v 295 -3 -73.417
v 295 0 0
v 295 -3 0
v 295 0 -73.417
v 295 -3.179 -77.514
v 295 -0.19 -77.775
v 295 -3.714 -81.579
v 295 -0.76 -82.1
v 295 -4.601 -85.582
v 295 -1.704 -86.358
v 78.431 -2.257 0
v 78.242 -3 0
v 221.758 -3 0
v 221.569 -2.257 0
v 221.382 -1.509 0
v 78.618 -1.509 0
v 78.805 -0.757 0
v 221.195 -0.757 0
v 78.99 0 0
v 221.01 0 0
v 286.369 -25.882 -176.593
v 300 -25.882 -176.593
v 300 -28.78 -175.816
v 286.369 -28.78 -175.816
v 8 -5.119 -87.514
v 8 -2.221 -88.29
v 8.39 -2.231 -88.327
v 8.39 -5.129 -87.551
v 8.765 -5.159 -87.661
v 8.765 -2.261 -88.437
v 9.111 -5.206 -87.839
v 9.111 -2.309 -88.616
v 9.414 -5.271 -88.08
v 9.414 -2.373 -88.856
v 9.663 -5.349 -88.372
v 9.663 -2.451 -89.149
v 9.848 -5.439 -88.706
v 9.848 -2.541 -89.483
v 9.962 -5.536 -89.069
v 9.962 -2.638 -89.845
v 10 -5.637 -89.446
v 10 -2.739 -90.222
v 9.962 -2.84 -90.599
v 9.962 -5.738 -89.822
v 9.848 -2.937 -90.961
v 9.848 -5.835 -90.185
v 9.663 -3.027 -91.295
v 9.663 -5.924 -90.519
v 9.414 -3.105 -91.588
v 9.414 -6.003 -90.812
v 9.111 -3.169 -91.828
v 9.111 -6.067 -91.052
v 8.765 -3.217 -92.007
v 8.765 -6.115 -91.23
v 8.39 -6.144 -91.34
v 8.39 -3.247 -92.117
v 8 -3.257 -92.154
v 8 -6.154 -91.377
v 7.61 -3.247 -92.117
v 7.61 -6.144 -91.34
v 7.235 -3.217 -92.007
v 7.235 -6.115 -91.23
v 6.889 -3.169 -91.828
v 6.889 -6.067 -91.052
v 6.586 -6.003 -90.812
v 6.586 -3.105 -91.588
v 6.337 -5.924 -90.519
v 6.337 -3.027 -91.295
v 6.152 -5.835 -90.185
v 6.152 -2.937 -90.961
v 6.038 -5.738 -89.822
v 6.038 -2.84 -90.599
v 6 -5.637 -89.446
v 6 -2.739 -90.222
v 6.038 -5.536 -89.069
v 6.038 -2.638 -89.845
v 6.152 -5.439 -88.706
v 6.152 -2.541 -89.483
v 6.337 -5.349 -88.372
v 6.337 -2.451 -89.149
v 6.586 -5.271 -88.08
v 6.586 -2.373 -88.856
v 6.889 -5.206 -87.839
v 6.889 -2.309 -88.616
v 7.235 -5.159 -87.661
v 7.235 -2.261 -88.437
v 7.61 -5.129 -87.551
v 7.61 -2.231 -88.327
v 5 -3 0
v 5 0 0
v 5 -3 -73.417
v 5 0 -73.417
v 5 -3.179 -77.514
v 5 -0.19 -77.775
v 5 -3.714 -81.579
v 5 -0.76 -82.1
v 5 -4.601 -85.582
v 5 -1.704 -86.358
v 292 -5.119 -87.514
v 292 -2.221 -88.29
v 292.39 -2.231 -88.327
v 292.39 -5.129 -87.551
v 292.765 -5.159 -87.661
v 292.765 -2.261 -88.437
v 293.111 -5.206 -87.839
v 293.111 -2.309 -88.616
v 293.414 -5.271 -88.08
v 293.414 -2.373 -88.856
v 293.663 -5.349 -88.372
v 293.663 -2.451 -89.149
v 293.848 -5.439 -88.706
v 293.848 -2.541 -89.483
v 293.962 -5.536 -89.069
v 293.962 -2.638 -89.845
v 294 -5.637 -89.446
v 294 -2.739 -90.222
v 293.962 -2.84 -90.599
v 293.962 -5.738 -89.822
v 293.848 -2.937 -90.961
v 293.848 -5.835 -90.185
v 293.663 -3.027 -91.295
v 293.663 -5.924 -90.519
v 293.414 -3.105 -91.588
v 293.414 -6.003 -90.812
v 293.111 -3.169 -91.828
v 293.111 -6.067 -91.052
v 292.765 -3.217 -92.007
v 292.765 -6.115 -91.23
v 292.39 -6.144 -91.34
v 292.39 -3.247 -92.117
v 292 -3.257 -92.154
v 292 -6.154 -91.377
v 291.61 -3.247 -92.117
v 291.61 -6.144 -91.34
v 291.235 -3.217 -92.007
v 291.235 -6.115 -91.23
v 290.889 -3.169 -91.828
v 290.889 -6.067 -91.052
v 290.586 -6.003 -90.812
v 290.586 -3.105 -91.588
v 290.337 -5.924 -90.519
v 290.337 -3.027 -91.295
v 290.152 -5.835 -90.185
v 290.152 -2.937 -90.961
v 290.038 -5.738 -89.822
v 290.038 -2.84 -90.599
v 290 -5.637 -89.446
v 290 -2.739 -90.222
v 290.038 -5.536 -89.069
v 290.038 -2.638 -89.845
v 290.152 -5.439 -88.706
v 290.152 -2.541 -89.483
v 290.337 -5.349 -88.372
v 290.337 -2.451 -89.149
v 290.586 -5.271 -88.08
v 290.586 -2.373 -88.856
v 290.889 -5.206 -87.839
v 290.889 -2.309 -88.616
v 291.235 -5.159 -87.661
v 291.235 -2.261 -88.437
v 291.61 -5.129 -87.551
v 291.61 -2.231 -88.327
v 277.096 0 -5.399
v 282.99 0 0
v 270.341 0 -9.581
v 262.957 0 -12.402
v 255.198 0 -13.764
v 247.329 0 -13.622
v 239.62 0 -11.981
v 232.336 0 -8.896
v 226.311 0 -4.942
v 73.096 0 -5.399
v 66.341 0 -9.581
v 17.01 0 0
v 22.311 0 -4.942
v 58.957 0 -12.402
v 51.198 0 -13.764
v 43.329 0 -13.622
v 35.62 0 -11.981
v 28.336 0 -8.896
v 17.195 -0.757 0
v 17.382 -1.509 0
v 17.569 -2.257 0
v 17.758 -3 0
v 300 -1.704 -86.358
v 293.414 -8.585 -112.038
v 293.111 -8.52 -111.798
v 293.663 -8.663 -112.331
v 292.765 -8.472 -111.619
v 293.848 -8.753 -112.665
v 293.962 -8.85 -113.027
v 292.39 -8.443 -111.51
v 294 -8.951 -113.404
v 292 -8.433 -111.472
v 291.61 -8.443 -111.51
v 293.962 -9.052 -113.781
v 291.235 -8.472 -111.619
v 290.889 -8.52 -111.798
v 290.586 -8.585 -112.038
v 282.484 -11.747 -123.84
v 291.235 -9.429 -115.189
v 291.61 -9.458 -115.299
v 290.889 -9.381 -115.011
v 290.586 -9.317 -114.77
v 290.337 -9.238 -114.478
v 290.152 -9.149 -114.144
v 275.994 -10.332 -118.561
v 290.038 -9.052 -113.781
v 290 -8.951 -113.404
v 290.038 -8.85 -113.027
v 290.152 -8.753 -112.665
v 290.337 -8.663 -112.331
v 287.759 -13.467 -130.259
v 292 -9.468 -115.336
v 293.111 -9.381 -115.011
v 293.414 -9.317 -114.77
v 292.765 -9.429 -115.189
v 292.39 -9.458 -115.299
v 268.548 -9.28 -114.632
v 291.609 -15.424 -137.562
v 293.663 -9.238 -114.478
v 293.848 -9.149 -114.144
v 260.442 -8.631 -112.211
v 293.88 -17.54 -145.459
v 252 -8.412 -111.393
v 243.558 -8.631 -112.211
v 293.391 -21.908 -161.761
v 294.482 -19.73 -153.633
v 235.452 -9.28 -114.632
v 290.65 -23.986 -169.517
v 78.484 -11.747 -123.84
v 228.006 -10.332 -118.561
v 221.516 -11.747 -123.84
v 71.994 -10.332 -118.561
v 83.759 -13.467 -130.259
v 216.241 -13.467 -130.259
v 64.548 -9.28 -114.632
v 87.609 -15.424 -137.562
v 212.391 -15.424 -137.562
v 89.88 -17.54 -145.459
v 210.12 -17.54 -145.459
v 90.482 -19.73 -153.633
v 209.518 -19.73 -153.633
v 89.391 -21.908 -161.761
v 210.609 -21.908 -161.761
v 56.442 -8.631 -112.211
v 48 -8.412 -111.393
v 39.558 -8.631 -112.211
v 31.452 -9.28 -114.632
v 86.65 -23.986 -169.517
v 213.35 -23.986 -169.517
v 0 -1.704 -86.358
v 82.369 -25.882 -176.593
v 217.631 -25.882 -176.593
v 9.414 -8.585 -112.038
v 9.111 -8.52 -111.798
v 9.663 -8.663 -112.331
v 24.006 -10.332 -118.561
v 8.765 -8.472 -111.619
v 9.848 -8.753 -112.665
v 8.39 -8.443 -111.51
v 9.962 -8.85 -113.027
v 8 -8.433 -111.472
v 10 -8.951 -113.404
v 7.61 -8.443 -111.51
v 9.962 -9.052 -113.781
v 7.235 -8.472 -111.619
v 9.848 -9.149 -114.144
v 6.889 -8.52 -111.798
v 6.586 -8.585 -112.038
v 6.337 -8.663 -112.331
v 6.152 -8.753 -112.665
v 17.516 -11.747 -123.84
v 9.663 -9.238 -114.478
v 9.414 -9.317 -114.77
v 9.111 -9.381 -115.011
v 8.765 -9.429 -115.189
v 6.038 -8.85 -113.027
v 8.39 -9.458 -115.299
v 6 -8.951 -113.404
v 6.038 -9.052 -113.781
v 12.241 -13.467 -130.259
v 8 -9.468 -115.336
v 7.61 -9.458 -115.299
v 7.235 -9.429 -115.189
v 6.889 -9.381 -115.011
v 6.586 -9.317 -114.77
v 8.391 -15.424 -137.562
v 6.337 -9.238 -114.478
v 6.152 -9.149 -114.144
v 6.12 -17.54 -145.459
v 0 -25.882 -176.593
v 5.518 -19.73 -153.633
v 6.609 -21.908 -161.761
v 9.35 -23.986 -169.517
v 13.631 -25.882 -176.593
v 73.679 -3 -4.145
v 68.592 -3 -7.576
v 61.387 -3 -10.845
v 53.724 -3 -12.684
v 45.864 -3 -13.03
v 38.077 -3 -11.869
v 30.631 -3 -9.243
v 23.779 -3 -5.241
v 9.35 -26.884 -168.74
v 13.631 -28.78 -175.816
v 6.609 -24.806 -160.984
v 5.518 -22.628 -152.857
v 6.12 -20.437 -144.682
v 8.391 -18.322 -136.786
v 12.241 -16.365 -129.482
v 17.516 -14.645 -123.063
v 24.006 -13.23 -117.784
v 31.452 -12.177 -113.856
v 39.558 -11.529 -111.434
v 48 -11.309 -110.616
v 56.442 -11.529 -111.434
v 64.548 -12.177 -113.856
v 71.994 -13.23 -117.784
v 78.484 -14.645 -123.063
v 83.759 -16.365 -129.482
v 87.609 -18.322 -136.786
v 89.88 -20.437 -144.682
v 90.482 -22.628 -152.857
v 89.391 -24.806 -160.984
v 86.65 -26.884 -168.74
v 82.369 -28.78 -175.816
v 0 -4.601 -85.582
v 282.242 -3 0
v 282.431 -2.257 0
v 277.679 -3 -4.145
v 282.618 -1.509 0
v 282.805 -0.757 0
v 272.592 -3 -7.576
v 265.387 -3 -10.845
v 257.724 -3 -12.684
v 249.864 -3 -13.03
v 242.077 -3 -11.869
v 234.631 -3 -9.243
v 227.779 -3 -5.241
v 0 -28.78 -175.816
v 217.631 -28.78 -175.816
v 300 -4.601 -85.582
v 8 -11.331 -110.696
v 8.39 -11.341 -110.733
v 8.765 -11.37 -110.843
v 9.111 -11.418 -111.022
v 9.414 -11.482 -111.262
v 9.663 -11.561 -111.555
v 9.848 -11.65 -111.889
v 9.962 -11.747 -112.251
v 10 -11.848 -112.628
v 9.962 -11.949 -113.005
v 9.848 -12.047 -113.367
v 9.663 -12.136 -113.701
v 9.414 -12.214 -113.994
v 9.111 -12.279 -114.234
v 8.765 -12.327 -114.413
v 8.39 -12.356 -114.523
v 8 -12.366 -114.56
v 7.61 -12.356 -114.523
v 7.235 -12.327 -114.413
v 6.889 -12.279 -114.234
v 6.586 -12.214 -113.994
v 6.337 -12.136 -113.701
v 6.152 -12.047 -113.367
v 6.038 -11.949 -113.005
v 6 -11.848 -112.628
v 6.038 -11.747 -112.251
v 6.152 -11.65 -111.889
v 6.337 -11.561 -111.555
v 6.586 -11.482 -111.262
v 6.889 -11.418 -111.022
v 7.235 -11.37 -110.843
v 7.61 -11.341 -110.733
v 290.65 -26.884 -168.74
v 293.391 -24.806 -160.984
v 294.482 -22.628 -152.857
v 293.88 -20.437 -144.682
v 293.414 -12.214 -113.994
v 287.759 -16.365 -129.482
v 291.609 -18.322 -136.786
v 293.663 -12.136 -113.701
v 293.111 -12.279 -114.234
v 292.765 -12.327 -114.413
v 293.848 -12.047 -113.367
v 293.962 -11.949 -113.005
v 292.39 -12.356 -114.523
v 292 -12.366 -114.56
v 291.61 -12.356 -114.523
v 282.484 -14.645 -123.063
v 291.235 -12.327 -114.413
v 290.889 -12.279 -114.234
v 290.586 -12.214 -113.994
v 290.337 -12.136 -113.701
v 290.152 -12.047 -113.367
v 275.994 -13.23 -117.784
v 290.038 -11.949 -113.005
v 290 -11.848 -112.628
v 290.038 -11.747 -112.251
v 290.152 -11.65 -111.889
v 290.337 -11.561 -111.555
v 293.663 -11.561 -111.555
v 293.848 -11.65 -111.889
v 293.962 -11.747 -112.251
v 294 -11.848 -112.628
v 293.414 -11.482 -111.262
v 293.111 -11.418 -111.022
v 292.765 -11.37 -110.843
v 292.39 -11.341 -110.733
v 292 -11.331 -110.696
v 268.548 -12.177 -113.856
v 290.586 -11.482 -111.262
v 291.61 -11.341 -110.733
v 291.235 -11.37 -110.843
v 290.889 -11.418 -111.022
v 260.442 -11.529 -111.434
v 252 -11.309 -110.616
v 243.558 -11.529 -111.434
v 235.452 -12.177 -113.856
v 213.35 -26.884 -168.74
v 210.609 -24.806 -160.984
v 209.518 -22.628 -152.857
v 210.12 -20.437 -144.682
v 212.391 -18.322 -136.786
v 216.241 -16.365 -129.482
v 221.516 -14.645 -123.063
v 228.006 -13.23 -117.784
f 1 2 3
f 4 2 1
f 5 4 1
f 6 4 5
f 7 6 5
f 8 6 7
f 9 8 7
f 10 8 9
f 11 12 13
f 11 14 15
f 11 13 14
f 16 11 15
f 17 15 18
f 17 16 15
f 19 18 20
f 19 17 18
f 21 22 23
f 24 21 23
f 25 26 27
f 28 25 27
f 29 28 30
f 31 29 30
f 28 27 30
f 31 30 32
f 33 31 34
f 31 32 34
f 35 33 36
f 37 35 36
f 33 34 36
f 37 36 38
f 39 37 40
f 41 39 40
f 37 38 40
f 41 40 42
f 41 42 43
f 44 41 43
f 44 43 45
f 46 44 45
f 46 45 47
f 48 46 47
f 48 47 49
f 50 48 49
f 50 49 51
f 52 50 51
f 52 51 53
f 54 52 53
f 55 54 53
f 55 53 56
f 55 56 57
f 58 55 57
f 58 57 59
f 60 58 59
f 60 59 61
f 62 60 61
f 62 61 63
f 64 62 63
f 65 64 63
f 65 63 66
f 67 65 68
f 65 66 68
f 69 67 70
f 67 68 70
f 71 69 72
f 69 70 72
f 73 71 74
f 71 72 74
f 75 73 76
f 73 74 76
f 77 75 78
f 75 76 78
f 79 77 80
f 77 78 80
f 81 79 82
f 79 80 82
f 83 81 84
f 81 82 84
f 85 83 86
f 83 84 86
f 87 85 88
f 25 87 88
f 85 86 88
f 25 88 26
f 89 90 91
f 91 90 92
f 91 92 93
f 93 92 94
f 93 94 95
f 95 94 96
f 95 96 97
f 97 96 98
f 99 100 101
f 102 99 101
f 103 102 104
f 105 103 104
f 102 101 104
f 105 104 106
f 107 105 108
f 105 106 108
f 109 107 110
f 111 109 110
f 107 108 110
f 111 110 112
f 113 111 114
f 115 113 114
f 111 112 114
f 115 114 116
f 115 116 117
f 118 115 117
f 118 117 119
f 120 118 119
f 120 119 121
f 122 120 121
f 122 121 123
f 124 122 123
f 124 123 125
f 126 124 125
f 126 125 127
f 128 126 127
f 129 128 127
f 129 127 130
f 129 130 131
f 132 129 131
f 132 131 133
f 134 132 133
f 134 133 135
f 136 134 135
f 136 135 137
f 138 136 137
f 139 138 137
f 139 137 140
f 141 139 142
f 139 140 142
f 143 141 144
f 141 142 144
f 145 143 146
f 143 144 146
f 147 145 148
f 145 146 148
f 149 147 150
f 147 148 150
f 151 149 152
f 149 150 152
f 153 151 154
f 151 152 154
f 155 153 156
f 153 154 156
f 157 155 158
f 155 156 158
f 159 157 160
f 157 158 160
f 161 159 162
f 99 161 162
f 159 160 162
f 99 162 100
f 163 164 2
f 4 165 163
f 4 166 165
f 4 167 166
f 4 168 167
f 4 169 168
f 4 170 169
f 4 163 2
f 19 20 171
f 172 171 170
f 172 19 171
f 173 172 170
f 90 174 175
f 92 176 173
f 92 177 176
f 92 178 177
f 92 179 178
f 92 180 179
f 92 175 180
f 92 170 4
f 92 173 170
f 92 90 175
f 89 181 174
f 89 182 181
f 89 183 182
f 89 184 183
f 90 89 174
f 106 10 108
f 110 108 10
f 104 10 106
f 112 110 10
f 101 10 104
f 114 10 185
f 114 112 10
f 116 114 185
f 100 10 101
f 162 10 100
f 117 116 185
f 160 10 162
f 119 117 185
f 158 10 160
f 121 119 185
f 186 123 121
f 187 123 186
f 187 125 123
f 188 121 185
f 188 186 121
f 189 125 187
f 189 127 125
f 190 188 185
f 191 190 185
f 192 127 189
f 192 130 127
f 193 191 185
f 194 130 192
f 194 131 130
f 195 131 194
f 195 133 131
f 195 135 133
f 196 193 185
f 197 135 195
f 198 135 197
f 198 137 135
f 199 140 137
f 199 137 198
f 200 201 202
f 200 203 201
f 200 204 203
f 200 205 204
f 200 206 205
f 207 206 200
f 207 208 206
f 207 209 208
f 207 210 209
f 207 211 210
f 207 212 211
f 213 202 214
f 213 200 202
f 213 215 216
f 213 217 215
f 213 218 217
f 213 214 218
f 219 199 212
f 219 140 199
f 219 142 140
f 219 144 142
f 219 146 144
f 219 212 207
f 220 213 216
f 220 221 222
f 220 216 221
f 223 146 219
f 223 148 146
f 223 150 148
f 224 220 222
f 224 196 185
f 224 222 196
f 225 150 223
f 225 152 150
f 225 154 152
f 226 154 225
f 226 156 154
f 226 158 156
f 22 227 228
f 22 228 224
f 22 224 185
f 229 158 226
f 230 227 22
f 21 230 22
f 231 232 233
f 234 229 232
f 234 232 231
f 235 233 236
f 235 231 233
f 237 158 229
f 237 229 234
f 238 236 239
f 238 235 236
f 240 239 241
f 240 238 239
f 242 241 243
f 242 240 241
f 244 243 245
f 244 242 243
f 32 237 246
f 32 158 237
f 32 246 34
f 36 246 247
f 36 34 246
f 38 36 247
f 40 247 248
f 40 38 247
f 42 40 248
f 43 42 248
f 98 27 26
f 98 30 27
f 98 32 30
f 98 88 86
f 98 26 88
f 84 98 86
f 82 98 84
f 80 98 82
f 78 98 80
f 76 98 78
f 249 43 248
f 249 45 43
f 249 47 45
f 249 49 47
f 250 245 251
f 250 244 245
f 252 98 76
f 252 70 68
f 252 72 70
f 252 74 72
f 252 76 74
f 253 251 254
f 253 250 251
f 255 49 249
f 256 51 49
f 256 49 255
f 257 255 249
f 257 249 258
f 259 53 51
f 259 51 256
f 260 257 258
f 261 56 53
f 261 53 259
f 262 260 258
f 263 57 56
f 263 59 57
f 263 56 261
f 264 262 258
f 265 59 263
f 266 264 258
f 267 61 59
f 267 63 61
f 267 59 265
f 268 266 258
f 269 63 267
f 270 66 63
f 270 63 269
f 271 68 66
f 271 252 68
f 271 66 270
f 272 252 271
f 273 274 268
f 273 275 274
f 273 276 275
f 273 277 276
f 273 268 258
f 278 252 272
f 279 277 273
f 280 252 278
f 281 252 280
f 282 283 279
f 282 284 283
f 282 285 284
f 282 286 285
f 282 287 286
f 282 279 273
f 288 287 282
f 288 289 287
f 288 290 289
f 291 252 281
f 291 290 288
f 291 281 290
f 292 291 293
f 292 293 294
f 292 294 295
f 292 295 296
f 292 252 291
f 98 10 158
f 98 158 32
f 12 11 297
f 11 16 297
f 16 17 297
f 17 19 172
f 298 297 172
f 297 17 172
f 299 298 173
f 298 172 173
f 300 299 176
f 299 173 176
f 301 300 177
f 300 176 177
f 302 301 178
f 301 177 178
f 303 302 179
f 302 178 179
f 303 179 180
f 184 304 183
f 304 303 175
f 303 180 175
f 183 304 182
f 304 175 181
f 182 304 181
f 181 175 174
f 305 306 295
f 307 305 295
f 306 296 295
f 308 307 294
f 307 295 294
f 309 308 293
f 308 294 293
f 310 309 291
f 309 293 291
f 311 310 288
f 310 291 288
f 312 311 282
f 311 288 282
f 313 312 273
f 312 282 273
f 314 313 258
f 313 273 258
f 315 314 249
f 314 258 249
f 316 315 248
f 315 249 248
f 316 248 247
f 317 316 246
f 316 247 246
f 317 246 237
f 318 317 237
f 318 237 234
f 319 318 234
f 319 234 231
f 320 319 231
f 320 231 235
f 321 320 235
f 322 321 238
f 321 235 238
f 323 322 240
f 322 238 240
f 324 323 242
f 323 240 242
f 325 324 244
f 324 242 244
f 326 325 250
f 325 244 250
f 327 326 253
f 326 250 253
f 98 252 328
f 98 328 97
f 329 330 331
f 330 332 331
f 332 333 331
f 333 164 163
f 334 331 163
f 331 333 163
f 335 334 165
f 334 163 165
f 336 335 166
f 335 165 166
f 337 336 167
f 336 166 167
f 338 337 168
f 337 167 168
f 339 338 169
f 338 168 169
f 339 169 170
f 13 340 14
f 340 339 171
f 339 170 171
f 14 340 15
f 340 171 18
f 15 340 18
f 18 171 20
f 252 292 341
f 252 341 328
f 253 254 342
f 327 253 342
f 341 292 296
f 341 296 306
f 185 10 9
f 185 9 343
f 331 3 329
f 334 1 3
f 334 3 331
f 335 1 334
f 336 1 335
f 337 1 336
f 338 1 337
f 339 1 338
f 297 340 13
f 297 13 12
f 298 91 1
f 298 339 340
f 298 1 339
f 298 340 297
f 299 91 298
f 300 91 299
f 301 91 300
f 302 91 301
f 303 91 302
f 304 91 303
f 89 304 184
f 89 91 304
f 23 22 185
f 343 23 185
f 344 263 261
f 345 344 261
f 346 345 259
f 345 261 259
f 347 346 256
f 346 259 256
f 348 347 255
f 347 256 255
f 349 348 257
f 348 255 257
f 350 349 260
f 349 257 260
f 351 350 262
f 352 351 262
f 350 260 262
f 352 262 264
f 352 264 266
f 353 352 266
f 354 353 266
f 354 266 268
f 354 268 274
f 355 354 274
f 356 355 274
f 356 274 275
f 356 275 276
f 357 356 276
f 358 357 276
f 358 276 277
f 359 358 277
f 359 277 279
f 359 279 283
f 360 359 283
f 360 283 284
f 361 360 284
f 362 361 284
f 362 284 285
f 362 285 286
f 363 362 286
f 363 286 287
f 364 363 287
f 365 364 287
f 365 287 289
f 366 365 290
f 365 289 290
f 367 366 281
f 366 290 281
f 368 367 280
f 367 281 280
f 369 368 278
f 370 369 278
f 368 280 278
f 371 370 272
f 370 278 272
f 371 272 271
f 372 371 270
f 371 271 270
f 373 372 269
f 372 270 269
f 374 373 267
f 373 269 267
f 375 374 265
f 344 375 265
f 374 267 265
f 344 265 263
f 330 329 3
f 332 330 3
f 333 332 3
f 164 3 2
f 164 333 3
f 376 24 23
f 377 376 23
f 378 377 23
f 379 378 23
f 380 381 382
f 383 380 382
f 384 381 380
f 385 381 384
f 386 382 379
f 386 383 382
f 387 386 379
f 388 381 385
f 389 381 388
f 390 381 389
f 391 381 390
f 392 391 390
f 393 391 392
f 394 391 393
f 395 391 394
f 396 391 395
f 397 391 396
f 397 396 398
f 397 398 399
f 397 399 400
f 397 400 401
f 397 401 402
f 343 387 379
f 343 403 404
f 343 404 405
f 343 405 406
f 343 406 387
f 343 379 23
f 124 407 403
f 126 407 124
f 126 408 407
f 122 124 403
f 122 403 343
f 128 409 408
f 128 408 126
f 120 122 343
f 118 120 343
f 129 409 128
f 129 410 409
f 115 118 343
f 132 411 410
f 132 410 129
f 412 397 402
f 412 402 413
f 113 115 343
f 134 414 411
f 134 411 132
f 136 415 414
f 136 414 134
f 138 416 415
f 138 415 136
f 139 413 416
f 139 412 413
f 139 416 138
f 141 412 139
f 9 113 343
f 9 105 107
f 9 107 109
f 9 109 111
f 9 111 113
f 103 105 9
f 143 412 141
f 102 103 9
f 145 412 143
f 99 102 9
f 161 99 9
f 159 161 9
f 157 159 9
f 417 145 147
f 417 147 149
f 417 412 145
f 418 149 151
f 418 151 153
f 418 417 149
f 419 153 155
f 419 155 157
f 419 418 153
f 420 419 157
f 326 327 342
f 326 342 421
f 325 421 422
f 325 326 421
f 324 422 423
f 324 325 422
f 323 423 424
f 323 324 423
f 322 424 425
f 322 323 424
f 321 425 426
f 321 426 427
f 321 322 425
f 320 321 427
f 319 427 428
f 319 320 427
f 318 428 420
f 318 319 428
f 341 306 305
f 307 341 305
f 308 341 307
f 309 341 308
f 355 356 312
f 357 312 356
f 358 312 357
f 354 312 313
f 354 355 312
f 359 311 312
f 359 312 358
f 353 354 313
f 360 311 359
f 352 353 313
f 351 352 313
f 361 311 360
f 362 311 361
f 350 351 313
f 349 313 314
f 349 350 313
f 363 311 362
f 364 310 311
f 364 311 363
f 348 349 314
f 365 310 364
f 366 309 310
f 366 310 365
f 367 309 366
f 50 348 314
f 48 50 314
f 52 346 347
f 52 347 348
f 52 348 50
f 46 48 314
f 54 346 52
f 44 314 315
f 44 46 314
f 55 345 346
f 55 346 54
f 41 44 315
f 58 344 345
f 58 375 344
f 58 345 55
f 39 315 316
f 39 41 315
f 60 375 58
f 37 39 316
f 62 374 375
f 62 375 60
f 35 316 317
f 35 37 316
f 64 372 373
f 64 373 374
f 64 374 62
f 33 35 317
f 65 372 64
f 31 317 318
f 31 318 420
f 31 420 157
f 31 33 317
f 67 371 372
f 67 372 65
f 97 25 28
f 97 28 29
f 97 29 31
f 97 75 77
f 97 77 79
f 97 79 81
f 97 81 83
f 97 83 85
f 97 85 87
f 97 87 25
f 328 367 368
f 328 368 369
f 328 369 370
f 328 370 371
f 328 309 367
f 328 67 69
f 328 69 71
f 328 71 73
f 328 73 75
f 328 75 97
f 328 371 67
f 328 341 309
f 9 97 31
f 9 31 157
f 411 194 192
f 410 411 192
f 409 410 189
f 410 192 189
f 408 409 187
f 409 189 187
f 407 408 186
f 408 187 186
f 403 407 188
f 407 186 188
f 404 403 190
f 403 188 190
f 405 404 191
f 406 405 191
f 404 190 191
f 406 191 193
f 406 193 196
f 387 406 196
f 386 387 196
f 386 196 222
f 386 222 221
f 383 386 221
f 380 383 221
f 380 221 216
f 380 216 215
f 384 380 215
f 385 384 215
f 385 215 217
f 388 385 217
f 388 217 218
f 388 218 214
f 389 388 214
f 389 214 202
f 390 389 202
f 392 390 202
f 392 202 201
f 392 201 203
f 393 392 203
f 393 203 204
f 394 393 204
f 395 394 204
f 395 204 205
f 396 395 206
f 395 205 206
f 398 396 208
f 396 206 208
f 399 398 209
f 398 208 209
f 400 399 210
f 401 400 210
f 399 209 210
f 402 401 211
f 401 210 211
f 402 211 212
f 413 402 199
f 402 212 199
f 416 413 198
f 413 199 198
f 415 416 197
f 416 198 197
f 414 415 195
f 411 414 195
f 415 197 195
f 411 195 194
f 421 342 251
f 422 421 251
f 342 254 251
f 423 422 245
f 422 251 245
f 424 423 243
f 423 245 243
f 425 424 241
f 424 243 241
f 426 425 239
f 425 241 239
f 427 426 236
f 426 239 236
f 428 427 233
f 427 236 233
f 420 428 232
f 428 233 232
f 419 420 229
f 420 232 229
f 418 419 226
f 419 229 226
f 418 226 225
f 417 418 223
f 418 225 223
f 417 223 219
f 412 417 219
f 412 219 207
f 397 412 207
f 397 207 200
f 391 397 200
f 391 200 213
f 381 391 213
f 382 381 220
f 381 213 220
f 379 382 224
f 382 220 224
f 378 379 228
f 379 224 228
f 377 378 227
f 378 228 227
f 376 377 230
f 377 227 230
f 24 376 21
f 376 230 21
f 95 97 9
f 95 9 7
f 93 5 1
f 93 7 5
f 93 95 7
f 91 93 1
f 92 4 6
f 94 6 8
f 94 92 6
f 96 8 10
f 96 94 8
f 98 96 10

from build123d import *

# Parameters (mm, degrees)
BOSS_EXTRUDE1_DEPTH = 300
SKETCH2_R           = 42.5
SKETCH2_W           = 5
SKETCH2_H           = 83.856690982
CUT_EXTRUDE1_DEPTH  = 349.855848061
SKETCH3_R           = 2
CUT_EXTRUDE2_DEPTH  = 349.855848061


with BuildPart() as part:
    # Sketch1 → Boss-Extrude1 (new body)
    with BuildSketch(Plane(origin=(0, 0, 0), x_dir=(0, 0, -1), z_dir=(1, 0, 0))):
        with BuildLine():
            Line((0, 0), (73.417375121, 0))
            ThreePointArc((73.417375121, 0), (79.943684732, -0.427756931), (86.358327376, -1.703708686))
            Line((86.358327376, -1.703708686), (176.592582629, -25.88190451))
            Line((176.592582629, -25.88190451), (175.816125494, -28.779681989))
            Line((175.816125494, -28.779681989), (85.58187024, -4.601486164))
            ThreePointArc((85.58187024, -4.601486164), (79.552106155, -3.402091515), (73.417375121, -3))
            Line((73.417375121, -3), (0, -3))
            Line((0, -3), (0, 0))
        make_face()
    extrude(amount=BOSS_EXTRUDE1_DEPTH)

    # Sketch2 → Cut-Extrude1 (cut, through all)
    with BuildSketch(Plane(origin=(0, 20, -5.358983849), x_dir=(1, 0, 0), z_dir=(0, 0.9659258262890681, -0.25881904510252174))):
        with Locations((48, 152.274066103)):
            Circle(SKETCH2_R)
        with Locations((252, 152.274066103)):
            Circle(SKETCH2_R)
        with Locations((48, -29.084261273)):
            Circle(SKETCH2_R)
        with Locations((252, -29.084261273)):
            Circle(SKETCH2_R)
        with Locations((2.5, 41.928345491)):
            Rectangle(SKETCH2_W, SKETCH2_H)
        with Locations((297.5, 41.928345491)):
            Rectangle(SKETCH2_W, SKETCH2_H)
    extrude(amount=-CUT_EXTRUDE1_DEPTH, mode=Mode.SUBTRACT)

    # Sketch3 → Cut-Extrude2 (cut, through all)
    with BuildSketch(Plane(origin=(0, 20, -5.358983849), x_dir=(1, 0, 0), z_dir=(0, 0.9659258262890681, -0.25881904510252174))):
        with Locations(Location((8, 87.856690982, 0), (0, 0, 270))):
            Circle(SKETCH3_R)
        with Locations(Location((8, 111.856690982, 0), (0, 0, 270))):
            Circle(SKETCH3_R)
        with Locations(Location((292, 87.856690982, 0), (0, 0, 270))):
            Circle(SKETCH3_R)
        with Locations(Location((292, 111.856690982, 0), (0, 0, 270))):
            Circle(SKETCH3_R)
    extrude(amount=-CUT_EXTRUDE2_DEPTH, mode=Mode.SUBTRACT)


solid = part.part
